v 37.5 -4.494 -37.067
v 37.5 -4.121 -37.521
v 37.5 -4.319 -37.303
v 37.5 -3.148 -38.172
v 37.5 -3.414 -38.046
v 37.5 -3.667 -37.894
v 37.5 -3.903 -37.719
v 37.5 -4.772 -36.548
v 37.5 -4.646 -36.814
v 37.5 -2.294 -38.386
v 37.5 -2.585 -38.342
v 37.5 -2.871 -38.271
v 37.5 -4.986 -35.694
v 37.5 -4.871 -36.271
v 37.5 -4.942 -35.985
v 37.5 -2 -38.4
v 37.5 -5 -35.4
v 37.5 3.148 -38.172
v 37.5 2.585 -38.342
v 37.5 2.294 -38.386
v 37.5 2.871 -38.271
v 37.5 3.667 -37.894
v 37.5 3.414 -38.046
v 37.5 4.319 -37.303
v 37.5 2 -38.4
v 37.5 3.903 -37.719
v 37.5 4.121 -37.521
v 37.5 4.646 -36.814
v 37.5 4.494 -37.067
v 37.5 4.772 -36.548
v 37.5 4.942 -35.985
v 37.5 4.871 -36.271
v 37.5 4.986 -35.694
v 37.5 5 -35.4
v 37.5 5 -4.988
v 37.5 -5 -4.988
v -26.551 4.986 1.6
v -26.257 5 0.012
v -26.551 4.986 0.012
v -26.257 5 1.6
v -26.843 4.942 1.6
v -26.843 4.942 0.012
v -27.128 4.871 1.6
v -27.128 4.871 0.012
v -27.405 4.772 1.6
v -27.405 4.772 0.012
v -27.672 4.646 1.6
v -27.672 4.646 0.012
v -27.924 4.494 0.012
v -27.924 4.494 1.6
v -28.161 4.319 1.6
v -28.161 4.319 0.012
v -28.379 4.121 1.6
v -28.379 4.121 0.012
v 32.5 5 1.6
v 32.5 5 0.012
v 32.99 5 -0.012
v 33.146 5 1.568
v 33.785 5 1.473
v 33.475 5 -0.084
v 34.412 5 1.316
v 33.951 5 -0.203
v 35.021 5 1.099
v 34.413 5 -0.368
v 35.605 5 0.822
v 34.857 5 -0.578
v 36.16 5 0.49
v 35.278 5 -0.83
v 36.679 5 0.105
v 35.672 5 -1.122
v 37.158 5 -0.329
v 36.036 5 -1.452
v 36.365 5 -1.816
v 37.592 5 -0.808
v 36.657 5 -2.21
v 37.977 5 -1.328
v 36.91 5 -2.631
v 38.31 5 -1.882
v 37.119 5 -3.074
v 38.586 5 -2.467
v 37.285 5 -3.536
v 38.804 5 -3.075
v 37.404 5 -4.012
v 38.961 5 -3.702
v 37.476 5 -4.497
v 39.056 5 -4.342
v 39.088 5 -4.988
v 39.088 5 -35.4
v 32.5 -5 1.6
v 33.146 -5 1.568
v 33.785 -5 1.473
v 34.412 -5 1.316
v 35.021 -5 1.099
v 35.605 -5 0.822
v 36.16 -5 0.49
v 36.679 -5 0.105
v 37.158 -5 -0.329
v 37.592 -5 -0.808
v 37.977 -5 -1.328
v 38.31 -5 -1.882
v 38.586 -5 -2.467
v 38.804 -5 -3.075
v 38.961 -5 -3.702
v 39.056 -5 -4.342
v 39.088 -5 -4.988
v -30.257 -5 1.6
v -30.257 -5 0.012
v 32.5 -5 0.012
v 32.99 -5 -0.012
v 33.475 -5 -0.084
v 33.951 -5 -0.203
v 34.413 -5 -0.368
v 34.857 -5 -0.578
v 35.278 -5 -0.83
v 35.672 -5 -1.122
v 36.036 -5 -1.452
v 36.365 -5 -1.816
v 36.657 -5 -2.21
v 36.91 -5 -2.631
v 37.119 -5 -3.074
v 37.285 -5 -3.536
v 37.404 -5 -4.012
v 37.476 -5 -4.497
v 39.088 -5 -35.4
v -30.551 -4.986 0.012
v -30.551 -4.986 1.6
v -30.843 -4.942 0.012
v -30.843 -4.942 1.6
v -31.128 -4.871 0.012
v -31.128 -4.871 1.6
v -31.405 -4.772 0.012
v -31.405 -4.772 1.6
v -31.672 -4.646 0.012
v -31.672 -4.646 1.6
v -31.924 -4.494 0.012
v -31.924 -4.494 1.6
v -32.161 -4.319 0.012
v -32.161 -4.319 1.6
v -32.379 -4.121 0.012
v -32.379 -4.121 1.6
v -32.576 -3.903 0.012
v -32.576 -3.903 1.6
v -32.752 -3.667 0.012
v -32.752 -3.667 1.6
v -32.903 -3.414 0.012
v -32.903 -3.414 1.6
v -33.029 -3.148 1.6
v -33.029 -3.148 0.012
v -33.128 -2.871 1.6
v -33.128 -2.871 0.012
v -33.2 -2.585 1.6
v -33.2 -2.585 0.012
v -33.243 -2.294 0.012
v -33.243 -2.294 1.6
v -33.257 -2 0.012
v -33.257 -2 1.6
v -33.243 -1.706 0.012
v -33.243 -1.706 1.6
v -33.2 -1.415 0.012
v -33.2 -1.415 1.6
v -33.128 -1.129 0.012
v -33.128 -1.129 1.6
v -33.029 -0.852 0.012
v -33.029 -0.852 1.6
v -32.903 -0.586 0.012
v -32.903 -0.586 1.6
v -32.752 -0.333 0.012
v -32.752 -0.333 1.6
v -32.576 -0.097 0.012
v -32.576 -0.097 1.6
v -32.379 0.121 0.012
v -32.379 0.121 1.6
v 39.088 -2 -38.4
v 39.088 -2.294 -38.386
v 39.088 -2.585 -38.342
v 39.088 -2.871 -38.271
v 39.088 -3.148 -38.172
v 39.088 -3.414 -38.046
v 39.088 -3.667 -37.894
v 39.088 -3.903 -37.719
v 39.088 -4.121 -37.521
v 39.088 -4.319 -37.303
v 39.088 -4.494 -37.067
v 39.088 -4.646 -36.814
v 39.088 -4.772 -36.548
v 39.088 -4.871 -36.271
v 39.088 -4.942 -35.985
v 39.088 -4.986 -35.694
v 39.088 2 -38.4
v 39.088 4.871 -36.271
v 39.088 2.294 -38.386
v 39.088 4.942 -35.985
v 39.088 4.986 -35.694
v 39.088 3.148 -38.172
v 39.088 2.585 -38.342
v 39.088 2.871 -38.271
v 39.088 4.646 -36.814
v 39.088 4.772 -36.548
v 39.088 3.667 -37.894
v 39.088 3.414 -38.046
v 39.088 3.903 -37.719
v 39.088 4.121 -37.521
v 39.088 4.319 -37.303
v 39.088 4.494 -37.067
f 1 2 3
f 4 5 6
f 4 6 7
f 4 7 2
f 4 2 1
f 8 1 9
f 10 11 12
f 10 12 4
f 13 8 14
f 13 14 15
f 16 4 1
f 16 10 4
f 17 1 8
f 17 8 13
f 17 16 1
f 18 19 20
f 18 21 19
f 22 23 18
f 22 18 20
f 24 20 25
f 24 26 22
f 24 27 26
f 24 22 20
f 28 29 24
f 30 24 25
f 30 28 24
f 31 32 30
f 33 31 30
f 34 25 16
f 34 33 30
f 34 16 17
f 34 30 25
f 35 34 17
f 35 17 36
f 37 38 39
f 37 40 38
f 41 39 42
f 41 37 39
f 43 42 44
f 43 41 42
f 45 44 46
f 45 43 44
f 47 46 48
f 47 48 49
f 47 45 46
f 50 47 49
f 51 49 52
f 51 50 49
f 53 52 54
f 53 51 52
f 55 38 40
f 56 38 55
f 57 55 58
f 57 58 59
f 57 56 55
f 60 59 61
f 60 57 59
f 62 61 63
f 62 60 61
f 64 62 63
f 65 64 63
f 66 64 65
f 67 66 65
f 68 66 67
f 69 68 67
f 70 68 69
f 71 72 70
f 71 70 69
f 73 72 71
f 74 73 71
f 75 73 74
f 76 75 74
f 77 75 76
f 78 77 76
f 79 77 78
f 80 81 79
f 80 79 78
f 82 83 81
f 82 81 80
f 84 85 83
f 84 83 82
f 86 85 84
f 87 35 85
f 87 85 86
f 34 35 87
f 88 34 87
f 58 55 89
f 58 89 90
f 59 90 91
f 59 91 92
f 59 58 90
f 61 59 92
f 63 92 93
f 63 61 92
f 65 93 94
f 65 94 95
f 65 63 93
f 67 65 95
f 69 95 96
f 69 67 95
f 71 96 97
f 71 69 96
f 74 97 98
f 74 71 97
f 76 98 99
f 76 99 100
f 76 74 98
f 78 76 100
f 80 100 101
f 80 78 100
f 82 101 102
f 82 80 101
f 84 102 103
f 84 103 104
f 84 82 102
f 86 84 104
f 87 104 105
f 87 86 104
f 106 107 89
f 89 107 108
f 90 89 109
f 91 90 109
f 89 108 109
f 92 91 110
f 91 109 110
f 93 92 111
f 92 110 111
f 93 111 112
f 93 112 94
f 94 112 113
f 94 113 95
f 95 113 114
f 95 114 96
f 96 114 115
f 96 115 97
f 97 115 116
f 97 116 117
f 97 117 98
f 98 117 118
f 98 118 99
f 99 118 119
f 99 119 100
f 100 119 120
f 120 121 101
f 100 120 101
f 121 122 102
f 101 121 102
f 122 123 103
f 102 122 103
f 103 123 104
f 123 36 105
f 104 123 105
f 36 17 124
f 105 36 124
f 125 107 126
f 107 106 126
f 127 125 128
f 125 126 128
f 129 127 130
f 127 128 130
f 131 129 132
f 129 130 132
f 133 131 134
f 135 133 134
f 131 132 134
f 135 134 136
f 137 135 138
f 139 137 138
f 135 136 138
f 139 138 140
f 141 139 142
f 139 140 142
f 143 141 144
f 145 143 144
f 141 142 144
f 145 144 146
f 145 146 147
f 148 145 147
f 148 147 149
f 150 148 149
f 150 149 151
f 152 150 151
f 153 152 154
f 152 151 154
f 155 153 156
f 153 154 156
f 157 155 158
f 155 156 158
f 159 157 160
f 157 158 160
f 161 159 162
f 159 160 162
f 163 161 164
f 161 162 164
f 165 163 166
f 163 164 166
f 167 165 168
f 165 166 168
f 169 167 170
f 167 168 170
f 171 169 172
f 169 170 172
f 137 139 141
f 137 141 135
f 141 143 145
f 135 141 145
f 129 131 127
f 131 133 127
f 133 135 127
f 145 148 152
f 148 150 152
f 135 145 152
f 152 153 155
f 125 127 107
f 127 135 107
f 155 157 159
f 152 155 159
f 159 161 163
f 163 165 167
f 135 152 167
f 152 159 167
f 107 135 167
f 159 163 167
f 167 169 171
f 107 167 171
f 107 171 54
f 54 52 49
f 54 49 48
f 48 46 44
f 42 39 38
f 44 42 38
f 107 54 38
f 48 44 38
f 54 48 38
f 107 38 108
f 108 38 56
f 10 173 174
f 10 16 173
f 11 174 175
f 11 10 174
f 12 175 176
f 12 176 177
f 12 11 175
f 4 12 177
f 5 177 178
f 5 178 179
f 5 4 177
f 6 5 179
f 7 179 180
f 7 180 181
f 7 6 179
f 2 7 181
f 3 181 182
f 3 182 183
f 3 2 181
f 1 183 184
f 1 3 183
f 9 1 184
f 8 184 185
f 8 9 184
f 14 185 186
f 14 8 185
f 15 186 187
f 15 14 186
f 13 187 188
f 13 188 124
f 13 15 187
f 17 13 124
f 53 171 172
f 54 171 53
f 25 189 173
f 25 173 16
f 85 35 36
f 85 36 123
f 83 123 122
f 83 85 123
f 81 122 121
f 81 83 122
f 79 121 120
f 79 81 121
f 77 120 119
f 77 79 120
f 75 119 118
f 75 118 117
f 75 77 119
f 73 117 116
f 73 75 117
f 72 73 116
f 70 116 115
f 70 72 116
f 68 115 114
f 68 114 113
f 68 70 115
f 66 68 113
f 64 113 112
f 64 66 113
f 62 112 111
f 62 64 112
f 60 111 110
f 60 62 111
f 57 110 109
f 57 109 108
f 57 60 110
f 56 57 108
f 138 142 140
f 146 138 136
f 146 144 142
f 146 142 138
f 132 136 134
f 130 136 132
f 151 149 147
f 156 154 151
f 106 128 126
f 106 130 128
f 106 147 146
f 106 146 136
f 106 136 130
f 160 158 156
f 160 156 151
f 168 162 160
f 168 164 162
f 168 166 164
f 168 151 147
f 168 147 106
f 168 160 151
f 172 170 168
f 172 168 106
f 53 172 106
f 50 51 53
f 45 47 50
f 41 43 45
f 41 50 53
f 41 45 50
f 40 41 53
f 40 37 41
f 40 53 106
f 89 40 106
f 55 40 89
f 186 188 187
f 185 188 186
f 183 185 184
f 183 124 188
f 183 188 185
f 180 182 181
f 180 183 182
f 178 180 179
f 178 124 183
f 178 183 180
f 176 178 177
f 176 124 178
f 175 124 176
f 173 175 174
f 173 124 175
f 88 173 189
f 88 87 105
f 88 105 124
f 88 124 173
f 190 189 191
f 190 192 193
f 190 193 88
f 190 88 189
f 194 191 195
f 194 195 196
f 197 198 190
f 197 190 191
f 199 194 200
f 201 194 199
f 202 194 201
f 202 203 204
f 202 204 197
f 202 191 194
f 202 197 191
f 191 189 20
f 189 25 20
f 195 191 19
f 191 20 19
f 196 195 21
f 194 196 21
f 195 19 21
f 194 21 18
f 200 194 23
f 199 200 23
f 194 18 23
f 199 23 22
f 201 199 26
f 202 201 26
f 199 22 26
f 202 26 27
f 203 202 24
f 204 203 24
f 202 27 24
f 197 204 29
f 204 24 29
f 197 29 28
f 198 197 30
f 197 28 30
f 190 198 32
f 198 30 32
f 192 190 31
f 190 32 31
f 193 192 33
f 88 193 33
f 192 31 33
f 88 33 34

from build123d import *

# Parameters (mm, degrees)
SKETCH1_W                    = 75
SKETCH1_H                    = 10
BOSS_EXTRUDE1_DEPTH          = 1.6
CUT_EXTRUDE1_DEPTH           = 38.865683673
CUT_EXTRUDE1_DEPTH_BACK      = 10
CONVERT_SOLID1_DEPTH         = 0.0125
EDGE_FLANGE1_STRIP_W         = 16.35
EDGE_FLANGE1_STRIP_H         = 1.5875
EDGE_FLANGE1_STRIP_CUT_DEPTH = 10
EDGE_FLANGE1_DEPTH           = 10
FILLET1_R                    = 3


# Read off the part's stored shape, not the designer's step: Convert-Solid1
# Sheet-metal steps are written as plain solids
with BuildPart() as part:
    # Sketch1 → Boss-Extrude1 (new body)
    with BuildSketch(Plane.XY):
        Rectangle(SKETCH1_W, SKETCH1_H)
    extrude(amount=BOSS_EXTRUDE1_DEPTH)

    # Sketch2 → Cut-Extrude1 (cut, two sides: drawn at the far end of the back side and taken through both)
    with BuildSketch(Plane.XY.offset(1.6).offset(-CUT_EXTRUDE1_DEPTH_BACK)):
        Polygon((-37.5, 5), (-37.5, -5), (-27.5, 5), align=None)
    extrude(amount=CUT_EXTRUDE1_DEPTH + CUT_EXTRUDE1_DEPTH_BACK, mode=Mode.SUBTRACT)

    # Convert-Solid1 outline → Convert-Solid1 (cut)
    with BuildSketch(Plane.XY):
        Polygon((37.5, -5), (37.5, 5), (-27.5, 5), (-37.5, -5), align=None)
    extrude(amount=CONVERT_SOLID1_DEPTH, mode=Mode.SUBTRACT)

    # Edge-Flange1 strip (across the edge) → Edge-Flange1 strip cut (cut)
    with BuildSketch(Plane(origin=(37.5, 5, 0.0125), x_dir=(-1, 0, 0), z_dir=(0, -1, 0))):
        with Locations((-3.175, -0.79375)):
            Rectangle(EDGE_FLANGE1_STRIP_W, EDGE_FLANGE1_STRIP_H)
    extrude(amount=EDGE_FLANGE1_STRIP_CUT_DEPTH, mode=Mode.SUBTRACT)

    # Edge-Flange1 section (across the edge) → Edge-Flange1 (add)
    with BuildSketch(Plane(origin=(37.5, 5, 0.0125), x_dir=(-1, 0, 0), z_dir=(0, -1, 0))):
        with BuildLine():
            Line((-1.5875, 5), (-1.5875, 38.4125))
            Line((-1.5875, 38.4125), (0, 38.4125))
            Line((0, 38.4125), (0, 5))
            ThreePointArc((0, 5), (1.464466094, 1.464466094), (5, 0))
            Line((5, 0), (5, -1.5875))
            ThreePointArc((5, -1.5875), (0.341934079, 0.341934079), (-1.5875, 5))
        make_face()
    extrude(amount=EDGE_FLANGE1_DEPTH)

    # Fillet1
    fillet1_edges = [part.edges().sort_by_distance(p)[0] for p in [
        (38.29375, 5, -38.4),
        (38.29375, -5, -38.4),
        (-37.5, -5, 0.80625),
        (-27.5, 5, 0.80625),
    ]]
    fillet(fillet1_edges, radius=FILLET1_R)


solid = part.part
